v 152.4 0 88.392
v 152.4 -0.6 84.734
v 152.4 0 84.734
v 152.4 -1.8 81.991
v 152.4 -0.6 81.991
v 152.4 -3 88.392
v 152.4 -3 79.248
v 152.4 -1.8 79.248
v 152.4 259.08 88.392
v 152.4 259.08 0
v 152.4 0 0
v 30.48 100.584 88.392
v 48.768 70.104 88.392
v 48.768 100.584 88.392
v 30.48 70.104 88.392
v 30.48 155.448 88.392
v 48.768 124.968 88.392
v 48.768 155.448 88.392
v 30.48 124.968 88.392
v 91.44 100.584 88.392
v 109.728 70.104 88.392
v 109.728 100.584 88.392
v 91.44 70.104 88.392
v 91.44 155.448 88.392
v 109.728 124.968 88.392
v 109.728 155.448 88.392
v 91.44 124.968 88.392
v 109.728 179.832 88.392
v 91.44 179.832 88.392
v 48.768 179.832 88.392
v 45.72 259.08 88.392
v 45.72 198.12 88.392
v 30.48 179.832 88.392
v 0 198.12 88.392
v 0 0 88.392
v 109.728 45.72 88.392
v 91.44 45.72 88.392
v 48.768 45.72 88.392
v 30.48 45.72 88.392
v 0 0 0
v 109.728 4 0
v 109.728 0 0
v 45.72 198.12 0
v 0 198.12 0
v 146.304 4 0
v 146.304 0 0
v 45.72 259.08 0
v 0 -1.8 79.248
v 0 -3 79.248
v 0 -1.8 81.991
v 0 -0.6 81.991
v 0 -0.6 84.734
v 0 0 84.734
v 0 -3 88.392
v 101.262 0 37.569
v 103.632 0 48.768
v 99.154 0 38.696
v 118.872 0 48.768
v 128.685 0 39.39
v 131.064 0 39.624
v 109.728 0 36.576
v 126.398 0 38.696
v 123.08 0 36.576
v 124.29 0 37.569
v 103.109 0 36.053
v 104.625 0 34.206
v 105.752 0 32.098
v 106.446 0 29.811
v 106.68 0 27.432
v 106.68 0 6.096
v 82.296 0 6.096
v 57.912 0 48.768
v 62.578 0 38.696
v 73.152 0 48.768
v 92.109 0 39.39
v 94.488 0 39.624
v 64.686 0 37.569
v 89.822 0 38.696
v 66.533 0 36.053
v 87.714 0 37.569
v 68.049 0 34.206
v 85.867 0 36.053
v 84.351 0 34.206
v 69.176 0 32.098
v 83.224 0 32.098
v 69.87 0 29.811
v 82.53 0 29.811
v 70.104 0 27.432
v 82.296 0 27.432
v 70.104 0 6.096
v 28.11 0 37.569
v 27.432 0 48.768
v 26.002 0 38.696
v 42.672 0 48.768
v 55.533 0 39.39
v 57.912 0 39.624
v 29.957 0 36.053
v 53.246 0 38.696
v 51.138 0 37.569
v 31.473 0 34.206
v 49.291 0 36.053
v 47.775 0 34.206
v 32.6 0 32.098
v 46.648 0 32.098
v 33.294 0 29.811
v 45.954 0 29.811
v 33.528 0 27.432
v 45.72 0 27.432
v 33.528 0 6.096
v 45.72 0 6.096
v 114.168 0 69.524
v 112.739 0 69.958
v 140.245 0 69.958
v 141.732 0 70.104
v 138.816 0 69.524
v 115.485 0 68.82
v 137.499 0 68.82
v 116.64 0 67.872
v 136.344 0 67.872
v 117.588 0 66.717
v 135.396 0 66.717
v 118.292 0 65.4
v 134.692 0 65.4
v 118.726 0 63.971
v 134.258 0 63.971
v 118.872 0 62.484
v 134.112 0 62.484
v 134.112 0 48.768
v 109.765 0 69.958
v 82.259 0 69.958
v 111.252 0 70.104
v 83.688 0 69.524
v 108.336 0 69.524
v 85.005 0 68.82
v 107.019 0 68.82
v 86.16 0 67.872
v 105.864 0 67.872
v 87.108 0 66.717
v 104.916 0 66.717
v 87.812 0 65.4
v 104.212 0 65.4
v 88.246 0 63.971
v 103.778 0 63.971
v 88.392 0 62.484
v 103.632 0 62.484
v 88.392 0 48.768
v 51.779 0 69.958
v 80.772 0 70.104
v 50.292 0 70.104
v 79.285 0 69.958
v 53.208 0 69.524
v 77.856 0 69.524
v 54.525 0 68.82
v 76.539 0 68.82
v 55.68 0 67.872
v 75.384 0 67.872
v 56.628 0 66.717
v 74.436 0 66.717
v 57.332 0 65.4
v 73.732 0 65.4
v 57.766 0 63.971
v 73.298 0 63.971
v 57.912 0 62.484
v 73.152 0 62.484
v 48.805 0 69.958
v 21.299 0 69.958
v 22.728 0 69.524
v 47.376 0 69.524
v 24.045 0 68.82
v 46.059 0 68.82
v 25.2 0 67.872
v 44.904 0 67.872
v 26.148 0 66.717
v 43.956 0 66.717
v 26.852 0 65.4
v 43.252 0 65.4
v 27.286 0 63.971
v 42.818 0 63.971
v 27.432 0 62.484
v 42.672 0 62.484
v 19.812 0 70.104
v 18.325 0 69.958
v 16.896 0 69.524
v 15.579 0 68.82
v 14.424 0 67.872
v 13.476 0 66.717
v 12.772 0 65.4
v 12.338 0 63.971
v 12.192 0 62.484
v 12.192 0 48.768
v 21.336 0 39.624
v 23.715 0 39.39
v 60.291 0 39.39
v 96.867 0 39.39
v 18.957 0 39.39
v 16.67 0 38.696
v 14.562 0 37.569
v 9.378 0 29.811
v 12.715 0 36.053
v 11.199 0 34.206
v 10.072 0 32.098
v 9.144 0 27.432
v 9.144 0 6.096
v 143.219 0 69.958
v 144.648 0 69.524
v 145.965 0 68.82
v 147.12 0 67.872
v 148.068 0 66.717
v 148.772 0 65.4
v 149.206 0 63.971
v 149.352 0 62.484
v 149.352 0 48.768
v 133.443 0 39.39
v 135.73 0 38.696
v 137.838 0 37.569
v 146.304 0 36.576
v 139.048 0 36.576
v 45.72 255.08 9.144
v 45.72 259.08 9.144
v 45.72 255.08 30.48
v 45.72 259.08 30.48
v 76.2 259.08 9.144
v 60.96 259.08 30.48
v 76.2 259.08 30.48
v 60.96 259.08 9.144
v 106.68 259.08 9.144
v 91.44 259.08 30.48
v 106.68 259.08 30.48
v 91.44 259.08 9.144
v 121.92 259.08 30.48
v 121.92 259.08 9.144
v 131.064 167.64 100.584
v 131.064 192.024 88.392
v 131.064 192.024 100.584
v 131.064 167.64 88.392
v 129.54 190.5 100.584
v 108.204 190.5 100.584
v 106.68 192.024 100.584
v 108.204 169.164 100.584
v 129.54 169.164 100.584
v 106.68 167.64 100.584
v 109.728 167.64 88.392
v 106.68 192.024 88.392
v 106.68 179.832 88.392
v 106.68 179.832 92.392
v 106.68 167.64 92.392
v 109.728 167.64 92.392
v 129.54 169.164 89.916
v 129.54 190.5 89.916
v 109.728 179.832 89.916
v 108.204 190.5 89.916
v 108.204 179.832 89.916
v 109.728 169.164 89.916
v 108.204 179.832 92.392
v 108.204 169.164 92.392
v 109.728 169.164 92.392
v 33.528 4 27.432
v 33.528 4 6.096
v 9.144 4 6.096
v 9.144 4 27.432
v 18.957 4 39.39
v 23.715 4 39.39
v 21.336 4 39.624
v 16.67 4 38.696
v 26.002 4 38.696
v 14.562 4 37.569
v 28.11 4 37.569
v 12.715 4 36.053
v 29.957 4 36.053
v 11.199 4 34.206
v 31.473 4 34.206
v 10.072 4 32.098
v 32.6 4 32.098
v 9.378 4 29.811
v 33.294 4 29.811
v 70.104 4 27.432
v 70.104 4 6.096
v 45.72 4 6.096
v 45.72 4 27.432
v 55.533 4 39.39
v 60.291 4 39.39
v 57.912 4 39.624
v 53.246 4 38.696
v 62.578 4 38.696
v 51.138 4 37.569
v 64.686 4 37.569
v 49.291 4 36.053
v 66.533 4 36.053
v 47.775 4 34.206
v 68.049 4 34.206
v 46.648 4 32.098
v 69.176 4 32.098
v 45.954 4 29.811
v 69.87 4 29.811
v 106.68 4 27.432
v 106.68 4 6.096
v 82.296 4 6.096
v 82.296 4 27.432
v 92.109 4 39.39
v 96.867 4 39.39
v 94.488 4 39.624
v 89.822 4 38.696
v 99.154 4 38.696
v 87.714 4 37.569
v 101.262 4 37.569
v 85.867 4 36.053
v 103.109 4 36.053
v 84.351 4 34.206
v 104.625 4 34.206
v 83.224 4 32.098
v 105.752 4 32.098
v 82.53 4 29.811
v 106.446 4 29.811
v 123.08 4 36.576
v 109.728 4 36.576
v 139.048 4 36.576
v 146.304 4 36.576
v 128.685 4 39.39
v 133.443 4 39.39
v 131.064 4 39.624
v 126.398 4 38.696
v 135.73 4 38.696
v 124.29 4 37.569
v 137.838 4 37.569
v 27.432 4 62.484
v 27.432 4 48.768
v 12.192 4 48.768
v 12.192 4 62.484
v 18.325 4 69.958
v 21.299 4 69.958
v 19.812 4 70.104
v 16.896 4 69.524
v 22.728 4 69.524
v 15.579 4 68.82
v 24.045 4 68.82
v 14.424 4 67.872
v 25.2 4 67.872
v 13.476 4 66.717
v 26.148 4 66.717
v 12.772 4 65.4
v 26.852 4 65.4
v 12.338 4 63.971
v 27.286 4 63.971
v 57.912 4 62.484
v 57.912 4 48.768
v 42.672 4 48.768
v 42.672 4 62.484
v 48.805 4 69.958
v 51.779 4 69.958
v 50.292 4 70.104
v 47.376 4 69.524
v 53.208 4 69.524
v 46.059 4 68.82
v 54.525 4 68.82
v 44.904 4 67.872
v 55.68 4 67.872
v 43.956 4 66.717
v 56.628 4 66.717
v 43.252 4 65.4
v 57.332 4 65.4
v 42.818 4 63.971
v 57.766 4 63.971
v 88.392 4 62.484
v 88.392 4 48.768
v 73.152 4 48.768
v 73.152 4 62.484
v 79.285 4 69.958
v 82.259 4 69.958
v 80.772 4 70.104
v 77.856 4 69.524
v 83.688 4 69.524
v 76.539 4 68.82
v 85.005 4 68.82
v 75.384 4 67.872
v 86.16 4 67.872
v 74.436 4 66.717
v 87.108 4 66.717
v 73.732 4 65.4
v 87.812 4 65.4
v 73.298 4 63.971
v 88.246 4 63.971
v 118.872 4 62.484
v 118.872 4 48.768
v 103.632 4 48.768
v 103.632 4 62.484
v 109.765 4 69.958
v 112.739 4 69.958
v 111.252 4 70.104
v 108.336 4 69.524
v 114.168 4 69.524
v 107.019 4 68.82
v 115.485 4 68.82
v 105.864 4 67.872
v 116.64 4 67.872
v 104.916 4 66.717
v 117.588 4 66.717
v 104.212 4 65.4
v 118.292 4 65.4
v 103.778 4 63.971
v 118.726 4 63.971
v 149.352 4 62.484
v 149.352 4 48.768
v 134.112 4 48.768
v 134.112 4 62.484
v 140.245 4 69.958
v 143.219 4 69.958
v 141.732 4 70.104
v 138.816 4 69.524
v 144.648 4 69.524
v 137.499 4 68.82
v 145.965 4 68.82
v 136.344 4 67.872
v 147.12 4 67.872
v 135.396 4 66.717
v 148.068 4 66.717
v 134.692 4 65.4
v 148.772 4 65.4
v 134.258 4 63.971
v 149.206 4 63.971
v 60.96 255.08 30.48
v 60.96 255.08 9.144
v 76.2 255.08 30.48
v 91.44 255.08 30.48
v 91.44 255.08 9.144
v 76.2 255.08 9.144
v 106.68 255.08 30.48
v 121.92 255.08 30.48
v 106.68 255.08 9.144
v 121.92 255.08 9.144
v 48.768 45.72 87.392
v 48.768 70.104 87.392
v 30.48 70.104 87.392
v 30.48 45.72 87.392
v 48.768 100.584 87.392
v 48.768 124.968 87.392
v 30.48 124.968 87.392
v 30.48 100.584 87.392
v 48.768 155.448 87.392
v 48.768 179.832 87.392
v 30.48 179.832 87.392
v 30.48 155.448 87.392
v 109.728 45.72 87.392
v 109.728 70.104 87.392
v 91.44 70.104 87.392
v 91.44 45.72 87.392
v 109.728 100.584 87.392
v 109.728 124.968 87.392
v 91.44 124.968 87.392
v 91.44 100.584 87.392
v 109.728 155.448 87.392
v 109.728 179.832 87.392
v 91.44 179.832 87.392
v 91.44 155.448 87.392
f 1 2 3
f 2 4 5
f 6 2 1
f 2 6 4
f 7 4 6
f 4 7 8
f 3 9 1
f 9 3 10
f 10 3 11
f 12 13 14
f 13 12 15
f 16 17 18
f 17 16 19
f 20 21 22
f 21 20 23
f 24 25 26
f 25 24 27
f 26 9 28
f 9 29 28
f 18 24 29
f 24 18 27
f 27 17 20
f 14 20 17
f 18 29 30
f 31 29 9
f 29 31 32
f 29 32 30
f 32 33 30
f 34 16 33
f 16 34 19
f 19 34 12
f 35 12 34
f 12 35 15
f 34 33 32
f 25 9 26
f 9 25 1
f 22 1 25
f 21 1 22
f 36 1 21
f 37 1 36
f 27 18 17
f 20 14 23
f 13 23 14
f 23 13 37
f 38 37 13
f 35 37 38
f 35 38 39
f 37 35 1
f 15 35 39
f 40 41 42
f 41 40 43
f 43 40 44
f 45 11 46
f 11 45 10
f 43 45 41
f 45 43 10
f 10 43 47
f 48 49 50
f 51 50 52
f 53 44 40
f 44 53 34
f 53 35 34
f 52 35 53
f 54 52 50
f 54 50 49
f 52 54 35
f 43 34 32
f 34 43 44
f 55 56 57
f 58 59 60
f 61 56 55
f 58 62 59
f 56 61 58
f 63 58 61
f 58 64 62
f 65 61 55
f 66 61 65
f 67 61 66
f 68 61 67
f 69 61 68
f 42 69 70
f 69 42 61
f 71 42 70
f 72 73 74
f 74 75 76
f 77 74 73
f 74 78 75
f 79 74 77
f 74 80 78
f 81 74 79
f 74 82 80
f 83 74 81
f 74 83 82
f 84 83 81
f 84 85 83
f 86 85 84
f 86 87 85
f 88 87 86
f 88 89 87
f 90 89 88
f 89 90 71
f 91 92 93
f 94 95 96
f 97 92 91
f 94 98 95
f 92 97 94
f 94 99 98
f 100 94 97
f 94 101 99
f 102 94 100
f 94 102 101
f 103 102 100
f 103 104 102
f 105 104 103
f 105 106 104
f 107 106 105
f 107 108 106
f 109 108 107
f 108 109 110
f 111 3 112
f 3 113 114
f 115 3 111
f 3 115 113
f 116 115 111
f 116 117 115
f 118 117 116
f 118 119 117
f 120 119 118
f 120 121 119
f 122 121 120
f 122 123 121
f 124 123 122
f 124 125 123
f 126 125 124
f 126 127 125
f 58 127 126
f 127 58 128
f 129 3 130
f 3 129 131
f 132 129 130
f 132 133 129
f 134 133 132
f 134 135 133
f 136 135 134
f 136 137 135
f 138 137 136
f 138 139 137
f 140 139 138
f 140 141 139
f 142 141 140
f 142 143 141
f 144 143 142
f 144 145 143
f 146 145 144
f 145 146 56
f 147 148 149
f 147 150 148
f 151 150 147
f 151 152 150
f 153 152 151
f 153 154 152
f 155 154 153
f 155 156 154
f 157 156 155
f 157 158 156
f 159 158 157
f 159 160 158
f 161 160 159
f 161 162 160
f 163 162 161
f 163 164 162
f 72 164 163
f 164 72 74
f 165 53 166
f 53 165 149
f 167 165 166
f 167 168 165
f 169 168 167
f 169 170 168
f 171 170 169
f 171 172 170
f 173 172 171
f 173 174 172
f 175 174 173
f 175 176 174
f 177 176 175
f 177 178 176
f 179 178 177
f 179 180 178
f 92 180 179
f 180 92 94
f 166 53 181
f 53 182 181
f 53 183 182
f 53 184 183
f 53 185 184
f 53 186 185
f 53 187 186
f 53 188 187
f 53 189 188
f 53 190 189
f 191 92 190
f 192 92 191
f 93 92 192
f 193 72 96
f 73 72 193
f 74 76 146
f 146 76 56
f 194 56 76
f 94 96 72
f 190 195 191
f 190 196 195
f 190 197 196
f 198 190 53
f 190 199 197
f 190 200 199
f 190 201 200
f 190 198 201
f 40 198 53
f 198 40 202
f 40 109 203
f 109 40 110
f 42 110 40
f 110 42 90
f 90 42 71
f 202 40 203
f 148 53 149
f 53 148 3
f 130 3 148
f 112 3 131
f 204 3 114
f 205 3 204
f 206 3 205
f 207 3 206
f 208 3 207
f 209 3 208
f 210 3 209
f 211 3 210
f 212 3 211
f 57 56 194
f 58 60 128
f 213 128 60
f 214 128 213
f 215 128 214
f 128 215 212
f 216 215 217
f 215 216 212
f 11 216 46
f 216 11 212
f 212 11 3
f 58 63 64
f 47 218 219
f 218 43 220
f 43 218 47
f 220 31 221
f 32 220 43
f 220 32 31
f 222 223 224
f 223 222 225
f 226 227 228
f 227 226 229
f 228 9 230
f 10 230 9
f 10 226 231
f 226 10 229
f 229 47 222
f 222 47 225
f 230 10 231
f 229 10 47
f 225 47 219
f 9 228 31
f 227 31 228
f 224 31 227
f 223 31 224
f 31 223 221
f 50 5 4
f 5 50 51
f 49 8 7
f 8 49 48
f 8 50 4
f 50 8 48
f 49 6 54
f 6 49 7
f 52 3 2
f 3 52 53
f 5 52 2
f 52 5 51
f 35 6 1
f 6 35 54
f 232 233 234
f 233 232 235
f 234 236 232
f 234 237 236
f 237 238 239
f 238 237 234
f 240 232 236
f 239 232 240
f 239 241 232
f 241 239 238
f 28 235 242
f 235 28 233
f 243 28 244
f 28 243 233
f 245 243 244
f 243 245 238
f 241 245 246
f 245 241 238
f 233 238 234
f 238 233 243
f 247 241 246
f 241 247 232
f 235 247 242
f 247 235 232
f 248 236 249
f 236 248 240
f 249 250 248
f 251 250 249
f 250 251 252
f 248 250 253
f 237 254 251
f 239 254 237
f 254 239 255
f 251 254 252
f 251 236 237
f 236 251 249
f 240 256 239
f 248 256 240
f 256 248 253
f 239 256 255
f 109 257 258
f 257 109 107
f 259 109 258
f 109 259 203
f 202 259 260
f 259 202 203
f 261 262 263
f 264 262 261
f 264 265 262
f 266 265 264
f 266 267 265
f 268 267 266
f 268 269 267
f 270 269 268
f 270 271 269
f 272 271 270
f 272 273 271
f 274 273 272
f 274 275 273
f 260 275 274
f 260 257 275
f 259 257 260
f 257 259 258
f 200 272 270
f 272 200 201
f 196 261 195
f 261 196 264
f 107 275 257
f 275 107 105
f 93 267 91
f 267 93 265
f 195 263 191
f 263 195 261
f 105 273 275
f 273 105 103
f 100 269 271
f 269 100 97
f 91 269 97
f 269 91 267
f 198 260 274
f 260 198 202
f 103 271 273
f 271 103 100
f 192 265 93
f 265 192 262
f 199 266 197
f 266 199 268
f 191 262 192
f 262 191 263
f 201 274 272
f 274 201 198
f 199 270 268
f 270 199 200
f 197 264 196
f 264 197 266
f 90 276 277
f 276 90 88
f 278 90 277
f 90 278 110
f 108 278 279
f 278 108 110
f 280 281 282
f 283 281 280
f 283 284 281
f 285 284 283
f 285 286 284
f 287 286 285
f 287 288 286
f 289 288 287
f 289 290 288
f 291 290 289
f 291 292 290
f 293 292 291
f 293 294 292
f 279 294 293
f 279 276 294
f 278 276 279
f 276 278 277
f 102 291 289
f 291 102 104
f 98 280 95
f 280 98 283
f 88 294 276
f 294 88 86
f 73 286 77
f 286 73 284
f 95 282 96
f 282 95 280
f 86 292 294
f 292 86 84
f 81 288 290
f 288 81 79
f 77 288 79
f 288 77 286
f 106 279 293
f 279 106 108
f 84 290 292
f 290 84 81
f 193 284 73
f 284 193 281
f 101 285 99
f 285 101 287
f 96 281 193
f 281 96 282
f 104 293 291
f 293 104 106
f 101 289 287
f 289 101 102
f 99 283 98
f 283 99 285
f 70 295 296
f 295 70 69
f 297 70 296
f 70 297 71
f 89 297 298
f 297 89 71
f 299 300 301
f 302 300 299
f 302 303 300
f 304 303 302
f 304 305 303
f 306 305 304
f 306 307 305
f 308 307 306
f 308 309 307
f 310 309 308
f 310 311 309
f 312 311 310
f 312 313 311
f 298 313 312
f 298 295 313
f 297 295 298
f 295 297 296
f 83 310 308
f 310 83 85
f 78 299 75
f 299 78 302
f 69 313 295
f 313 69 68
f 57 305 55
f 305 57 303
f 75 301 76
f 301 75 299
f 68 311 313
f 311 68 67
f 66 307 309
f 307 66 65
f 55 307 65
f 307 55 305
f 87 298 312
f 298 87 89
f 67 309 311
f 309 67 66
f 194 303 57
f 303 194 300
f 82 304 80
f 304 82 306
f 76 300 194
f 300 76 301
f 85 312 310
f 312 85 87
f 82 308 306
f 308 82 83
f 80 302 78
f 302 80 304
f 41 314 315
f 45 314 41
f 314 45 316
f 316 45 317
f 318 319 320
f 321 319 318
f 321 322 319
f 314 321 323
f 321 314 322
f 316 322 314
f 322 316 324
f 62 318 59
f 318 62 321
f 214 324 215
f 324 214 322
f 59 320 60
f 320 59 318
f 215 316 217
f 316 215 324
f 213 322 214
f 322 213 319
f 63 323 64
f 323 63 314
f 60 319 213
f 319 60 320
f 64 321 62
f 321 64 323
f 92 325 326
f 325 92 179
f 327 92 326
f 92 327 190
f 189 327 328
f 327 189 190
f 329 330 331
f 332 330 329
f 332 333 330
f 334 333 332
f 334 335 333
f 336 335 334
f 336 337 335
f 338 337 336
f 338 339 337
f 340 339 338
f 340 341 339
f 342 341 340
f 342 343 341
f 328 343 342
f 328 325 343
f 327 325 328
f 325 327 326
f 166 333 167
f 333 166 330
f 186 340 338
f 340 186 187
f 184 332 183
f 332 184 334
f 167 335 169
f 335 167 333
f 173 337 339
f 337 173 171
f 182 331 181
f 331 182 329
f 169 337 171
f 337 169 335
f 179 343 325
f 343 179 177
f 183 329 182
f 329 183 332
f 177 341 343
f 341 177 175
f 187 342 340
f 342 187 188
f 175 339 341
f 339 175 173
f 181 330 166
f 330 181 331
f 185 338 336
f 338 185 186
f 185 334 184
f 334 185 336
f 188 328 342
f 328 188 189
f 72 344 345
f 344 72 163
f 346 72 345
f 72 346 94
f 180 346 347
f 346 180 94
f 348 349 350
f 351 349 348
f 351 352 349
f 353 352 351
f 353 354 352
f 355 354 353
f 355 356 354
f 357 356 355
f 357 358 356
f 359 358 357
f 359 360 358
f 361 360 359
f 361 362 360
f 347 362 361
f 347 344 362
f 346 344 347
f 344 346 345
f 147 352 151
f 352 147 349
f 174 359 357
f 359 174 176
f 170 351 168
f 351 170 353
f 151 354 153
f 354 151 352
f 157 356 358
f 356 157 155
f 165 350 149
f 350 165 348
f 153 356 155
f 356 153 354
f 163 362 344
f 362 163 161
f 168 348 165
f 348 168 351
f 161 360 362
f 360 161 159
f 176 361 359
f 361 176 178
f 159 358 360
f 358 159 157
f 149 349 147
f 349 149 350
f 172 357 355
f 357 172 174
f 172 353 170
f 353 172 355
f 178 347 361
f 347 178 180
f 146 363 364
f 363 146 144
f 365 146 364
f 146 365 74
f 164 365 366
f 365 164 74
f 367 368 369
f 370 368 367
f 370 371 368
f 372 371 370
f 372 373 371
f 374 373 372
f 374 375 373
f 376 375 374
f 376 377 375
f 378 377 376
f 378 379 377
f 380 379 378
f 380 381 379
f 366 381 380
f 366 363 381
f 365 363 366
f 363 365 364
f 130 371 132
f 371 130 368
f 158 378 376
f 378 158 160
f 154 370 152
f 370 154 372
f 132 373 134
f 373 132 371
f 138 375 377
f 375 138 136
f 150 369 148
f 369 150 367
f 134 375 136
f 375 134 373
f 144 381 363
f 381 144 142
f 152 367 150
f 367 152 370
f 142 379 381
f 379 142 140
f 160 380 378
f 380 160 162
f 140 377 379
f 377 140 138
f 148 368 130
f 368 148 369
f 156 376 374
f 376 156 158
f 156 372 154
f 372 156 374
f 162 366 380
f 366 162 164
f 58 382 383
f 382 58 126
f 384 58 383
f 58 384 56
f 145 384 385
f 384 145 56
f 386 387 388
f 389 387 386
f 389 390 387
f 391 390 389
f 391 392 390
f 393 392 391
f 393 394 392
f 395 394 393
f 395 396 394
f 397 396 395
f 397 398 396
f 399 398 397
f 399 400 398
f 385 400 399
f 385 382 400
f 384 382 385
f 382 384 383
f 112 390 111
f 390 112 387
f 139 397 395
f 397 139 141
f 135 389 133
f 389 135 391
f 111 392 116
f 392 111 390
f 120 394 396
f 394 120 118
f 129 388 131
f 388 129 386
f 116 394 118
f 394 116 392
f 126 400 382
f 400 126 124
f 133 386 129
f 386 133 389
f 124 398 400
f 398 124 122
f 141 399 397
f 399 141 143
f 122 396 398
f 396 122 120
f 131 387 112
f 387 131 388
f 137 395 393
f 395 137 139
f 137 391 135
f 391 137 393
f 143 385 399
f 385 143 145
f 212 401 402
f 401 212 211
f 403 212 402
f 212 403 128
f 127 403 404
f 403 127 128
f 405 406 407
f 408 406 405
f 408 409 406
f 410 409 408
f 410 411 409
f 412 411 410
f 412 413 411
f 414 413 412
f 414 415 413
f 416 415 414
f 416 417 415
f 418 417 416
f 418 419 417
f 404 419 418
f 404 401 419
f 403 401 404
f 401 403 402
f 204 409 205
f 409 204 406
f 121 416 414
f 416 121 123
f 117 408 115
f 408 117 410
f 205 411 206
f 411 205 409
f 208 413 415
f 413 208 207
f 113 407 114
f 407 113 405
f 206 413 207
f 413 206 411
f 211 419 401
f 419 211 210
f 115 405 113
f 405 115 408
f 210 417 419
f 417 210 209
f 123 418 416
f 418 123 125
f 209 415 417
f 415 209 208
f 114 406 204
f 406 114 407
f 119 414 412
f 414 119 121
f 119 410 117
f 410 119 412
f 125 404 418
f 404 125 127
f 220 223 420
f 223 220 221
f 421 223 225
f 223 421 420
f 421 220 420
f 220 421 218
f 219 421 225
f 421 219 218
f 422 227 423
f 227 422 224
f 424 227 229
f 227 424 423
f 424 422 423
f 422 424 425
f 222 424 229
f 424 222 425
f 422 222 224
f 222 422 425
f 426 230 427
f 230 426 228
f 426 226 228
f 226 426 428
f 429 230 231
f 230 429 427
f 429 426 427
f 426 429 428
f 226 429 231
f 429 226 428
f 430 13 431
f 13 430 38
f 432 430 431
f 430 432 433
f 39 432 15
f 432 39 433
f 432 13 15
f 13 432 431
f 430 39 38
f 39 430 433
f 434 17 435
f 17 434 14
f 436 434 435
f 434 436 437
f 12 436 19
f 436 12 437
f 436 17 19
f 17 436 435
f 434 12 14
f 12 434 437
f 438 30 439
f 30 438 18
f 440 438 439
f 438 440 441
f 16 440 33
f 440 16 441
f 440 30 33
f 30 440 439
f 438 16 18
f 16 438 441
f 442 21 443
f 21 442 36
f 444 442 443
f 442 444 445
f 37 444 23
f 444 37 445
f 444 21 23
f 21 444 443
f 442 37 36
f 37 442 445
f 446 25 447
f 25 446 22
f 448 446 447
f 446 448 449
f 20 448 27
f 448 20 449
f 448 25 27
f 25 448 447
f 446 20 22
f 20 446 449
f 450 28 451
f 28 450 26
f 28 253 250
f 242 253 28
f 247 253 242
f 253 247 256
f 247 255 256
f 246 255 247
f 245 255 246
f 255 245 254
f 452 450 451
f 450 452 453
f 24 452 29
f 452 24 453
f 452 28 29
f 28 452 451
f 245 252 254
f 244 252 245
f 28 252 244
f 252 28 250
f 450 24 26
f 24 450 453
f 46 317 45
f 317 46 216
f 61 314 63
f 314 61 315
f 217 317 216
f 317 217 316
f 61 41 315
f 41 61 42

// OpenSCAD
// Heron Building - 7 Heron Street, San Francisco
// 3D Printable Diorama Model
// Scale: 1:100 (1mm = 100mm real)

// Based on Boor Bridges Architecture drawings dated 2012-11-07

/* Real dimensions (approximate from drawings):
   - Main building footprint: ~50' x 85' (L-shaped)
   - 1st floor height: ~14'
   - 2nd floor height: ~12'
   - Parapet: ~3'
   - Total height: ~29'
*/

// === PARAMETERS ===
scale_factor = 1/100;  // 1:100 scale

// Real dimensions in mm (convert from feet: 1' = 304.8mm)
ft = 304.8;

// Building dimensions (in feet, will be scaled)
main_width = 50 * ft;      // East-West dimension
main_depth = 65 * ft;      // North-South main section
rear_depth = 20 * ft;      // Additional rear section
rear_width = 35 * ft;      // Width of rear section

floor1_height = 14 * ft;
floor2_height = 12 * ft;
parapet_height = 3 * ft;
total_height = floor1_height + floor2_height + parapet_height;

wall_thickness = 1 * ft;

// Window dimensions
arch_window_width = 6 * ft;
arch_window_height = 10 * ft;
rect_window_width = 4 * ft;
rect_window_height = 5 * ft;

// === MODULES ===

// Arched window cutout
module arch_window(w, h, depth=500) {
    radius = w/2;
    arch_height = h - radius;

    translate([0, 0, 0])
    union() {
        // Rectangular part
        cube([w, depth, arch_height]);
        // Arch part
        translate([radius, 0, arch_height])
        rotate([-90, 0, 0])
        cylinder(h=depth, r=radius, $fn=32);
    }
}

// Rectangular window cutout
module rect_window(w, h, depth=500) {
    cube([w, depth, h]);
}

// Decorative cornice
module cornice(length, projection=300, height=400) {
    // Simple stepped cornice profile
    translate([0, 0, 0])
    union() {
        cube([length, projection*0.3, height*0.3]);
        translate([0, 0, height*0.3])
        cube([length, projection*0.6, height*0.3]);
        translate([0, 0, height*0.6])
        cube([length, projection, height*0.4]);
    }
}

// Main building mass
module building_mass() {
    union() {
        // Main rectangular volume
        cube([main_width, main_depth, total_height]);

        // Rear L extension (northeast)
        translate([main_width - rear_width, main_depth, 0])
        cube([rear_width, rear_depth, total_height]);
    }
}

// South facade (street facing) with arched openings
module south_facade_windows() {
    window_y = -100;  // Slightly outside for clean cut

    // Large arched openings - ground floor
    // Based on elevation A4.1 - shows ~4 large arches
    for (i = [0:3]) {
        translate([3*ft + i * 12*ft, window_y, 2*ft])
        arch_window(8*ft, 11*ft);
    }

    // Second floor windows - smaller arches
    for (i = [0:4]) {
        translate([4*ft + i * 10*ft, window_y, floor1_height + 2*ft])
        arch_window(5*ft, 7*ft);
    }
}

// West facade windows
module west_facade_windows() {
    window_x = -100;

    // Ground floor - large arched windows
    for (i = [0:3]) {
        translate([window_x, 8*ft + i * 15*ft, 2*ft])
        rotate([0, 0, 90])
        arch_window(6*ft, 9*ft);
    }

    // Second floor windows
    for (i = [0:4]) {
        translate([window_x, 6*ft + i * 12*ft, floor1_height + 2*ft])
        rotate([0, 0, 90])
        arch_window(4*ft, 6*ft);
    }
}

// East facade windows
module east_facade_windows() {
    window_x = main_width + 100;

    // Similar pattern to west
    for (i = [0:3]) {
        translate([window_x, 8*ft + i * 15*ft, 2*ft])
        rotate([0, 0, -90])
        arch_window(6*ft, 9*ft);
    }

    for (i = [0:4]) {
        translate([window_x, 6*ft + i * 12*ft, floor1_height + 2*ft])
        rotate([0, 0, -90])
        arch_window(4*ft, 6*ft);
    }
}

// North facade (rear)
module north_facade_windows() {
    window_y = main_depth + rear_depth + 100;

    // Simpler rear facade
    for (i = [0:2]) {
        translate([main_width - rear_width + 5*ft + i * 10*ft, window_y, 3*ft])
        rotate([0, 0, 180])
        rect_window(5*ft, 7*ft);
    }
}

// Overhead door on south facade
module overhead_door() {
    translate([main_width - 14*ft, -100, 0])
    cube([12*ft, 500, 12*ft]);
}

// Skylights on roof
module skylights() {
    skylight_z = total_height - 100;

    // Based on roof plan - 6 skylights in grid pattern
    for (i = [0:1]) {
        for (j = [0:2]) {
            translate([10*ft + i * 20*ft, 15*ft + j * 18*ft, skylight_z])
            cube([6*ft, 8*ft, 500]);
        }
    }
}

// Parapet detail
module parapet_detail() {
    parapet_z = floor1_height + floor2_height;

    // South parapet with cornice
    translate([0, -300, parapet_z])
    cornice(main_width, 400, parapet_height);

    // East parapet
    translate([main_width, 0, parapet_z])
    rotate([0, 0, 90])
    cornice(main_depth, 300, parapet_height * 0.7);

    // West parapet
    translate([0, main_depth, parapet_z])
    rotate([0, 0, -90])
    cornice(main_depth, 300, parapet_height * 0.7);
}

// Patio area (recessed at ground level, south side)
module patio_cutout() {
    translate([2*ft, -100, 0])
    cube([20*ft, 15*ft + 100, floor1_height - 1*ft]);
}

// Roof access hatch structure
module roof_hatch() {
    translate([main_width - 15*ft, main_depth - 10*ft, total_height])
    difference() {
        cube([8*ft, 8*ft, 4*ft]);
        translate([0.5*ft, 0.5*ft, 0.5*ft])
        cube([7*ft, 7*ft, 4*ft]);
    }
}

// === MAIN ASSEMBLY ===

module heron_building() {
    difference() {
        union() {
            building_mass();
            parapet_detail();
            roof_hatch();
        }

        // Cut out all windows and doors
        south_facade_windows();
        west_facade_windows();
        east_facade_windows();
        north_facade_windows();
        overhead_door();
        skylights();
        // patio_cutout();  // Optional - uncomment for recessed patio
    }
}

// === RENDER ===

// Apply scale and render
scale([scale_factor, scale_factor, scale_factor])
heron_building();

// Uncomment below to add a base plate for easier printing
/*
translate([0, -5, -2])
scale([scale_factor, scale_factor, scale_factor])
cube([main_width + 4*ft, main_depth + rear_depth + 8*ft, 2/scale_factor]);
*/
